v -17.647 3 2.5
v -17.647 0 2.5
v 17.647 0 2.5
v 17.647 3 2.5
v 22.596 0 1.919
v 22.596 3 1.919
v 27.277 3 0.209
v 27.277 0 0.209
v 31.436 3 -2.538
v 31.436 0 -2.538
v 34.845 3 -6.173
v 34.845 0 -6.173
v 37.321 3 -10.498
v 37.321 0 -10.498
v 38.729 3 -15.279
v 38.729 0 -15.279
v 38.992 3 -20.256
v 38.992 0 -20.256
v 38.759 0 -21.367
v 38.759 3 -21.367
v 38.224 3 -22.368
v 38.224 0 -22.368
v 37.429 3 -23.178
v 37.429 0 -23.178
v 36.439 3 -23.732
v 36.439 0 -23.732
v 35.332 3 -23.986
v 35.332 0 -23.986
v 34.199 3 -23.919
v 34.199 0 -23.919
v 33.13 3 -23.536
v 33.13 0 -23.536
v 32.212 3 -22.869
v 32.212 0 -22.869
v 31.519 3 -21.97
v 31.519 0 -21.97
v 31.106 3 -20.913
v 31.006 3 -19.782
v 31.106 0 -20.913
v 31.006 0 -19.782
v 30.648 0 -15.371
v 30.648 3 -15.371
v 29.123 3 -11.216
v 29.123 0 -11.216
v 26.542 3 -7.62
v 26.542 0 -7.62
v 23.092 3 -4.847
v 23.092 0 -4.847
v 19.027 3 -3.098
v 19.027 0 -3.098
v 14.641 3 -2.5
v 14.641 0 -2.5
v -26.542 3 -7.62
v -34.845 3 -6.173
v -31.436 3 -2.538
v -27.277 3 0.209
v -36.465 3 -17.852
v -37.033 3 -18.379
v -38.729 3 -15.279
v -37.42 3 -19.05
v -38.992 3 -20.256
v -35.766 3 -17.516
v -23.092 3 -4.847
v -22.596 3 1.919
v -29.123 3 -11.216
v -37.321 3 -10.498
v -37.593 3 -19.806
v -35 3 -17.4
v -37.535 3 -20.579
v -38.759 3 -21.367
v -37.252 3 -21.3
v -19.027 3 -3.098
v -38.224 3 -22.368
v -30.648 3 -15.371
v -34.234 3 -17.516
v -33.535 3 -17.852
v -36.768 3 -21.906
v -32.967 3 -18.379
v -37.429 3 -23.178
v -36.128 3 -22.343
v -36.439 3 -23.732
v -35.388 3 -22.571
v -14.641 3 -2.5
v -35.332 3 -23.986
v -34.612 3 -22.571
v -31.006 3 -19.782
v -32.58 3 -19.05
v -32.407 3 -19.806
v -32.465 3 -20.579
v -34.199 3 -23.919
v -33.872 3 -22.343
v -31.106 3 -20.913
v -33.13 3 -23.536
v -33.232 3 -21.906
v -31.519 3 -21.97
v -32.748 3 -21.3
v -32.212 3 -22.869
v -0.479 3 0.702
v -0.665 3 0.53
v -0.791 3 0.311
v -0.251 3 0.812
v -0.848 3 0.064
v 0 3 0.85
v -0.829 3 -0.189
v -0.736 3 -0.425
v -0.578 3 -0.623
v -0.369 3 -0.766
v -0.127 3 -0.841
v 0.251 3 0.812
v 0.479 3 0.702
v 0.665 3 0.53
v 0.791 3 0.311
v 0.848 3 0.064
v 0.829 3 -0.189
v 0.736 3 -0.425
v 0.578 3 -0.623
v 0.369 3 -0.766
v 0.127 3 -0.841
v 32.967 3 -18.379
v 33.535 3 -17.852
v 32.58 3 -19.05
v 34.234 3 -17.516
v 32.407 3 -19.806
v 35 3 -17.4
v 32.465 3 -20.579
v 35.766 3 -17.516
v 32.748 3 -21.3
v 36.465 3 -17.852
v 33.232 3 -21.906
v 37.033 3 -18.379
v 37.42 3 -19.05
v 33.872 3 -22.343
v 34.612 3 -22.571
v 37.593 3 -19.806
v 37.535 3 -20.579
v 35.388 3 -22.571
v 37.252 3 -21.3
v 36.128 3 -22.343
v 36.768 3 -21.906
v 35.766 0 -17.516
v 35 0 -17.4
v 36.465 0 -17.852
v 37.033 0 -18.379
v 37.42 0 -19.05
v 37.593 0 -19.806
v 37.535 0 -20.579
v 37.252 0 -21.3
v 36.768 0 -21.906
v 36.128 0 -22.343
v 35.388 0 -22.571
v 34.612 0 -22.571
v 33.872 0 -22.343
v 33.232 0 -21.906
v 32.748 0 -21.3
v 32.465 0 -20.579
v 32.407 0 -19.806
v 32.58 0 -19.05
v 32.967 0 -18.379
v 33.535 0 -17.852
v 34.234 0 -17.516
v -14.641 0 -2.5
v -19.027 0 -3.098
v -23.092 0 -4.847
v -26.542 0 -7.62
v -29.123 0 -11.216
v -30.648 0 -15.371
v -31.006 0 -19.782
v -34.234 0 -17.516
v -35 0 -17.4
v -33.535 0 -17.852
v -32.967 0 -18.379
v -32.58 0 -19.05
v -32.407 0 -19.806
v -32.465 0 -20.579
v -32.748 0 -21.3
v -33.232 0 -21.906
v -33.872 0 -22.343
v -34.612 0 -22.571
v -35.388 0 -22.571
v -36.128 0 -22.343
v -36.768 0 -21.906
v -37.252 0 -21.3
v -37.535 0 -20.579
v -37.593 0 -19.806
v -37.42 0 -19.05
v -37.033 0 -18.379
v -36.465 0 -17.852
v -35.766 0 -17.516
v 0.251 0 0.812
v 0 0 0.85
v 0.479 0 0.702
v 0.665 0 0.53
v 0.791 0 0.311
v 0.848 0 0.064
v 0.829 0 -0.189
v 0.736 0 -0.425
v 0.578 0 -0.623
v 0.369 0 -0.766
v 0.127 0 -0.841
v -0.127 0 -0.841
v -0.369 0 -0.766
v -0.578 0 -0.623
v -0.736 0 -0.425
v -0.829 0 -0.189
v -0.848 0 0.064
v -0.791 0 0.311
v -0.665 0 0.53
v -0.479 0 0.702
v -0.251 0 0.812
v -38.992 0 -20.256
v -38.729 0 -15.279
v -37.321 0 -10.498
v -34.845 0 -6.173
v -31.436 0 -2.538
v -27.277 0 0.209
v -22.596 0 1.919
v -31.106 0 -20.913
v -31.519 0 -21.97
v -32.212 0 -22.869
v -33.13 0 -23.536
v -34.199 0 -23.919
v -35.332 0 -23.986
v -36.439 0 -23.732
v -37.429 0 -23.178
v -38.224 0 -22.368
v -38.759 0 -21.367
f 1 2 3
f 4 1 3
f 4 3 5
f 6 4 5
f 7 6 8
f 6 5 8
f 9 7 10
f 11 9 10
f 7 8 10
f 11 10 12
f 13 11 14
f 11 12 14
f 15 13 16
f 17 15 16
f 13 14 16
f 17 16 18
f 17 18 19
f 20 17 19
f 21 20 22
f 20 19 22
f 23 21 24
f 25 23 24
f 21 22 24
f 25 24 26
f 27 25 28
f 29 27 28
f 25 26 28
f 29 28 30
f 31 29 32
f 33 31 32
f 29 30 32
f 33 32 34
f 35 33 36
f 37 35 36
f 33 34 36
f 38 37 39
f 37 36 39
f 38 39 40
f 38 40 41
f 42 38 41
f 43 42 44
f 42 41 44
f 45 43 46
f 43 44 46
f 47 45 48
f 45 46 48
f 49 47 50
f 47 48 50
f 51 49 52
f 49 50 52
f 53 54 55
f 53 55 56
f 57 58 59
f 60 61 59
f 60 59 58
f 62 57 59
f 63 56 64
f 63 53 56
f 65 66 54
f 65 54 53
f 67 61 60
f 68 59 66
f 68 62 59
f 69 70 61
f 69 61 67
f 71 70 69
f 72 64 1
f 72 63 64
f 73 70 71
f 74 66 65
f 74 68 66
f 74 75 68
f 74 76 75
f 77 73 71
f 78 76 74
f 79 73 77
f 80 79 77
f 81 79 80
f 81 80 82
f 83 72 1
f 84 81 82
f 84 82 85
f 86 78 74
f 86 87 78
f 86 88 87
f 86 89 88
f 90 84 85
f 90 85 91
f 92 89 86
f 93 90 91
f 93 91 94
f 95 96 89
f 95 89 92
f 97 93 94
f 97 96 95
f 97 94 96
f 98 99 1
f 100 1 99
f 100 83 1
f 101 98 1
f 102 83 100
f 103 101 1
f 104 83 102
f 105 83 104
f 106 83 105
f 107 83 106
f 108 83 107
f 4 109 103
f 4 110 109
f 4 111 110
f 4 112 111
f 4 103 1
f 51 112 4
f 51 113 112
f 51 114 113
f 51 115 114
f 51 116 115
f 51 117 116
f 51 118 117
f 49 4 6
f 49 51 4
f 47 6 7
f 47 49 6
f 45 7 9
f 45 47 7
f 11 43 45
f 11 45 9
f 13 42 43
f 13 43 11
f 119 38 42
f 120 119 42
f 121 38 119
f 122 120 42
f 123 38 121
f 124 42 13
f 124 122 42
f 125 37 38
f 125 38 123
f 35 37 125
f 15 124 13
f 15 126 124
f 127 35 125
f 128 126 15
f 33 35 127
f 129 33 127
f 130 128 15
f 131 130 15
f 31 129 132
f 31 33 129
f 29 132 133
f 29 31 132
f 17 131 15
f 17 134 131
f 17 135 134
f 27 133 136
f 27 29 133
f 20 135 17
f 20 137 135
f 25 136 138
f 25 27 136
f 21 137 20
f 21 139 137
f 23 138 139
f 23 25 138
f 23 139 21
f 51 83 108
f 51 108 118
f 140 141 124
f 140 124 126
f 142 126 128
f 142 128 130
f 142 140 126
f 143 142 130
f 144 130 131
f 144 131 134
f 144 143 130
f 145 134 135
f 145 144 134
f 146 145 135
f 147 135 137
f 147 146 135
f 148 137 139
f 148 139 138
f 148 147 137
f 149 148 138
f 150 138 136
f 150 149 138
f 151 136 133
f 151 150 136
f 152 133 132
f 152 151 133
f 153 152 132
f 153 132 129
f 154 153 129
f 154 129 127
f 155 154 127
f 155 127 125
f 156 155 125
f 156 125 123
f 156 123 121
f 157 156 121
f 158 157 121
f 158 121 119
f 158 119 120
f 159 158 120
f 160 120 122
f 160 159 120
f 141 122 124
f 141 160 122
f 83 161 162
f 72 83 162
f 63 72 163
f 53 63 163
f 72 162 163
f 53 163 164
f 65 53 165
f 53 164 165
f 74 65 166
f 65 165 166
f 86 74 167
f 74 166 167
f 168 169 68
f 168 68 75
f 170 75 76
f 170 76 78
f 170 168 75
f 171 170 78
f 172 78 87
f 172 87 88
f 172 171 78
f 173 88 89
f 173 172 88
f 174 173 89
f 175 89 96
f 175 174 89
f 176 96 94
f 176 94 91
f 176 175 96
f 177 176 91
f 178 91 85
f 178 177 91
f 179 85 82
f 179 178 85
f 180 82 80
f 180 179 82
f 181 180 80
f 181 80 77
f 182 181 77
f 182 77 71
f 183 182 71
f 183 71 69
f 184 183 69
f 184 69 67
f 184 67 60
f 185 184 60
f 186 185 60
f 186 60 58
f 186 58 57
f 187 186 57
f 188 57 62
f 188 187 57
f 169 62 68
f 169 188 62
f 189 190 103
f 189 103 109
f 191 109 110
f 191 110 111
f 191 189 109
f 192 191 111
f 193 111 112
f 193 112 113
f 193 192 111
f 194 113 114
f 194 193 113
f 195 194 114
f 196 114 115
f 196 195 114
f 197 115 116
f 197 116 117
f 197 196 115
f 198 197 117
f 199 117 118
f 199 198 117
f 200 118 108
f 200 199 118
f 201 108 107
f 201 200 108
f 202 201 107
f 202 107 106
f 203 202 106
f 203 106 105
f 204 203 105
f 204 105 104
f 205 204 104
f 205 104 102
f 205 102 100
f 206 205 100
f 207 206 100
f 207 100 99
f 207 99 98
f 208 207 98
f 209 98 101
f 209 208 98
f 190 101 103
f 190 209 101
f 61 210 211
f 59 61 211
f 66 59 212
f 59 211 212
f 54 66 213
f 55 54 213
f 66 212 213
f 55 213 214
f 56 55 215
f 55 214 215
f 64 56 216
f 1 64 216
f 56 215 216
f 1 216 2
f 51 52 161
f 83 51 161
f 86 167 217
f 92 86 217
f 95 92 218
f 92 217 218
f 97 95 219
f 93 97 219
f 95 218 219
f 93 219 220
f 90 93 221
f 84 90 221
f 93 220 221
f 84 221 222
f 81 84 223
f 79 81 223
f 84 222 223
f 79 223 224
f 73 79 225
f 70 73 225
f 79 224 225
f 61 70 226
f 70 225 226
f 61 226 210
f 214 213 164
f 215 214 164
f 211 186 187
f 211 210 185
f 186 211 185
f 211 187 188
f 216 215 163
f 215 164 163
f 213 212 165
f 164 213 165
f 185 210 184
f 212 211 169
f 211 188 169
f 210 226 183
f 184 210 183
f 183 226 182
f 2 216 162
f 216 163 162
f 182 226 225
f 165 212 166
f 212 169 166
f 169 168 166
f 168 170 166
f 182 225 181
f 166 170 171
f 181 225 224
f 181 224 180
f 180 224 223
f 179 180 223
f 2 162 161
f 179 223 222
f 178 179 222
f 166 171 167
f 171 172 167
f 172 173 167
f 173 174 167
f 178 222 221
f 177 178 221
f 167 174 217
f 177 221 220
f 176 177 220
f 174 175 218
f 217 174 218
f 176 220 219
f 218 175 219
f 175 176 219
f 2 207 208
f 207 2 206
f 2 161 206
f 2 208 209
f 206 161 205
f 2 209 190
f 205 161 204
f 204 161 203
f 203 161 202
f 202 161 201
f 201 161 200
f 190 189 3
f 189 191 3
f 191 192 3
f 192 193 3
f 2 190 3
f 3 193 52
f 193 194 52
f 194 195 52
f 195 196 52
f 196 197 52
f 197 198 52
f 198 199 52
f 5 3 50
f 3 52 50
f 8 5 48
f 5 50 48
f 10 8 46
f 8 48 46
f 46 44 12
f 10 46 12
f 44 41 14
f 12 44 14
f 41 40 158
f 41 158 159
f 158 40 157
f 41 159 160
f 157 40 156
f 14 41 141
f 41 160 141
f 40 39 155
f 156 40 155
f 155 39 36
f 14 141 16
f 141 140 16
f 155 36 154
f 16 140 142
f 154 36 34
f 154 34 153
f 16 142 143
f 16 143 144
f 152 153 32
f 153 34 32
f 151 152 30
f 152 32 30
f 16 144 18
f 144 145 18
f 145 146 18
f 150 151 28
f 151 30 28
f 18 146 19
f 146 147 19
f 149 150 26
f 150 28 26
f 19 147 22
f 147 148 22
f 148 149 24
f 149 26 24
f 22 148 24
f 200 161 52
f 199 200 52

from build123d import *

# Parameters (mm, degrees)
SKETCH_1_R      = 2.6
SKETCH_1_R_2    = 0.85
EXTRUDE_1_DEPTH = 3


with BuildPart() as part:
    # 草图1 → 凸台-拉伸1 (new body)
    with BuildSketch(Plane(origin=(0, 0, 0), x_dir=(1, 0, 0), z_dir=(0, 1, 0))):
        with BuildLine():
            Line((14.641409653, 2.5), (-14.641409653, 2.5))
            ThreePointArc((-14.641409653, 2.5), (-26.541683504, 7.620386051), (-31.005944031, 19.782016246))
            ThreePointArc((-31.005944031, 19.782016246), (-34.76320991, 23.992985156), (-38.991825792, 20.255591176))
            ThreePointArc((-38.991825792, 20.255591176), (-33.246595423, 4.255838584), (-17.646646706, -2.5))
            Line((-17.646646706, -2.5), (17.646646706, -2.5))
            ThreePointArc((17.646646706, -2.5), (33.246595423, 4.255838584), (38.991825792, 20.255591176))
            ThreePointArc((38.991825792, 20.255591176), (34.76320991, 23.992985156), (31.005944031, 19.782016246))
            ThreePointArc((31.005944031, 19.782016246), (26.541683504, 7.620386051), (14.641409653, 2.5))
        make_face()
        with Locations(Location((35, 20, 0), (0, 0, 270))):
            Circle(SKETCH_1_R, mode=Mode.SUBTRACT)
        with Locations(Location((-35, 20, 0), (0, 0, 270))):
            Circle(SKETCH_1_R, mode=Mode.SUBTRACT)
        with Locations(Location((0, 0, 0), (0, 0, 270))):
            Circle(SKETCH_1_R_2, mode=Mode.SUBTRACT)
    extrude(amount=EXTRUDE_1_DEPTH)


solid = part.part
